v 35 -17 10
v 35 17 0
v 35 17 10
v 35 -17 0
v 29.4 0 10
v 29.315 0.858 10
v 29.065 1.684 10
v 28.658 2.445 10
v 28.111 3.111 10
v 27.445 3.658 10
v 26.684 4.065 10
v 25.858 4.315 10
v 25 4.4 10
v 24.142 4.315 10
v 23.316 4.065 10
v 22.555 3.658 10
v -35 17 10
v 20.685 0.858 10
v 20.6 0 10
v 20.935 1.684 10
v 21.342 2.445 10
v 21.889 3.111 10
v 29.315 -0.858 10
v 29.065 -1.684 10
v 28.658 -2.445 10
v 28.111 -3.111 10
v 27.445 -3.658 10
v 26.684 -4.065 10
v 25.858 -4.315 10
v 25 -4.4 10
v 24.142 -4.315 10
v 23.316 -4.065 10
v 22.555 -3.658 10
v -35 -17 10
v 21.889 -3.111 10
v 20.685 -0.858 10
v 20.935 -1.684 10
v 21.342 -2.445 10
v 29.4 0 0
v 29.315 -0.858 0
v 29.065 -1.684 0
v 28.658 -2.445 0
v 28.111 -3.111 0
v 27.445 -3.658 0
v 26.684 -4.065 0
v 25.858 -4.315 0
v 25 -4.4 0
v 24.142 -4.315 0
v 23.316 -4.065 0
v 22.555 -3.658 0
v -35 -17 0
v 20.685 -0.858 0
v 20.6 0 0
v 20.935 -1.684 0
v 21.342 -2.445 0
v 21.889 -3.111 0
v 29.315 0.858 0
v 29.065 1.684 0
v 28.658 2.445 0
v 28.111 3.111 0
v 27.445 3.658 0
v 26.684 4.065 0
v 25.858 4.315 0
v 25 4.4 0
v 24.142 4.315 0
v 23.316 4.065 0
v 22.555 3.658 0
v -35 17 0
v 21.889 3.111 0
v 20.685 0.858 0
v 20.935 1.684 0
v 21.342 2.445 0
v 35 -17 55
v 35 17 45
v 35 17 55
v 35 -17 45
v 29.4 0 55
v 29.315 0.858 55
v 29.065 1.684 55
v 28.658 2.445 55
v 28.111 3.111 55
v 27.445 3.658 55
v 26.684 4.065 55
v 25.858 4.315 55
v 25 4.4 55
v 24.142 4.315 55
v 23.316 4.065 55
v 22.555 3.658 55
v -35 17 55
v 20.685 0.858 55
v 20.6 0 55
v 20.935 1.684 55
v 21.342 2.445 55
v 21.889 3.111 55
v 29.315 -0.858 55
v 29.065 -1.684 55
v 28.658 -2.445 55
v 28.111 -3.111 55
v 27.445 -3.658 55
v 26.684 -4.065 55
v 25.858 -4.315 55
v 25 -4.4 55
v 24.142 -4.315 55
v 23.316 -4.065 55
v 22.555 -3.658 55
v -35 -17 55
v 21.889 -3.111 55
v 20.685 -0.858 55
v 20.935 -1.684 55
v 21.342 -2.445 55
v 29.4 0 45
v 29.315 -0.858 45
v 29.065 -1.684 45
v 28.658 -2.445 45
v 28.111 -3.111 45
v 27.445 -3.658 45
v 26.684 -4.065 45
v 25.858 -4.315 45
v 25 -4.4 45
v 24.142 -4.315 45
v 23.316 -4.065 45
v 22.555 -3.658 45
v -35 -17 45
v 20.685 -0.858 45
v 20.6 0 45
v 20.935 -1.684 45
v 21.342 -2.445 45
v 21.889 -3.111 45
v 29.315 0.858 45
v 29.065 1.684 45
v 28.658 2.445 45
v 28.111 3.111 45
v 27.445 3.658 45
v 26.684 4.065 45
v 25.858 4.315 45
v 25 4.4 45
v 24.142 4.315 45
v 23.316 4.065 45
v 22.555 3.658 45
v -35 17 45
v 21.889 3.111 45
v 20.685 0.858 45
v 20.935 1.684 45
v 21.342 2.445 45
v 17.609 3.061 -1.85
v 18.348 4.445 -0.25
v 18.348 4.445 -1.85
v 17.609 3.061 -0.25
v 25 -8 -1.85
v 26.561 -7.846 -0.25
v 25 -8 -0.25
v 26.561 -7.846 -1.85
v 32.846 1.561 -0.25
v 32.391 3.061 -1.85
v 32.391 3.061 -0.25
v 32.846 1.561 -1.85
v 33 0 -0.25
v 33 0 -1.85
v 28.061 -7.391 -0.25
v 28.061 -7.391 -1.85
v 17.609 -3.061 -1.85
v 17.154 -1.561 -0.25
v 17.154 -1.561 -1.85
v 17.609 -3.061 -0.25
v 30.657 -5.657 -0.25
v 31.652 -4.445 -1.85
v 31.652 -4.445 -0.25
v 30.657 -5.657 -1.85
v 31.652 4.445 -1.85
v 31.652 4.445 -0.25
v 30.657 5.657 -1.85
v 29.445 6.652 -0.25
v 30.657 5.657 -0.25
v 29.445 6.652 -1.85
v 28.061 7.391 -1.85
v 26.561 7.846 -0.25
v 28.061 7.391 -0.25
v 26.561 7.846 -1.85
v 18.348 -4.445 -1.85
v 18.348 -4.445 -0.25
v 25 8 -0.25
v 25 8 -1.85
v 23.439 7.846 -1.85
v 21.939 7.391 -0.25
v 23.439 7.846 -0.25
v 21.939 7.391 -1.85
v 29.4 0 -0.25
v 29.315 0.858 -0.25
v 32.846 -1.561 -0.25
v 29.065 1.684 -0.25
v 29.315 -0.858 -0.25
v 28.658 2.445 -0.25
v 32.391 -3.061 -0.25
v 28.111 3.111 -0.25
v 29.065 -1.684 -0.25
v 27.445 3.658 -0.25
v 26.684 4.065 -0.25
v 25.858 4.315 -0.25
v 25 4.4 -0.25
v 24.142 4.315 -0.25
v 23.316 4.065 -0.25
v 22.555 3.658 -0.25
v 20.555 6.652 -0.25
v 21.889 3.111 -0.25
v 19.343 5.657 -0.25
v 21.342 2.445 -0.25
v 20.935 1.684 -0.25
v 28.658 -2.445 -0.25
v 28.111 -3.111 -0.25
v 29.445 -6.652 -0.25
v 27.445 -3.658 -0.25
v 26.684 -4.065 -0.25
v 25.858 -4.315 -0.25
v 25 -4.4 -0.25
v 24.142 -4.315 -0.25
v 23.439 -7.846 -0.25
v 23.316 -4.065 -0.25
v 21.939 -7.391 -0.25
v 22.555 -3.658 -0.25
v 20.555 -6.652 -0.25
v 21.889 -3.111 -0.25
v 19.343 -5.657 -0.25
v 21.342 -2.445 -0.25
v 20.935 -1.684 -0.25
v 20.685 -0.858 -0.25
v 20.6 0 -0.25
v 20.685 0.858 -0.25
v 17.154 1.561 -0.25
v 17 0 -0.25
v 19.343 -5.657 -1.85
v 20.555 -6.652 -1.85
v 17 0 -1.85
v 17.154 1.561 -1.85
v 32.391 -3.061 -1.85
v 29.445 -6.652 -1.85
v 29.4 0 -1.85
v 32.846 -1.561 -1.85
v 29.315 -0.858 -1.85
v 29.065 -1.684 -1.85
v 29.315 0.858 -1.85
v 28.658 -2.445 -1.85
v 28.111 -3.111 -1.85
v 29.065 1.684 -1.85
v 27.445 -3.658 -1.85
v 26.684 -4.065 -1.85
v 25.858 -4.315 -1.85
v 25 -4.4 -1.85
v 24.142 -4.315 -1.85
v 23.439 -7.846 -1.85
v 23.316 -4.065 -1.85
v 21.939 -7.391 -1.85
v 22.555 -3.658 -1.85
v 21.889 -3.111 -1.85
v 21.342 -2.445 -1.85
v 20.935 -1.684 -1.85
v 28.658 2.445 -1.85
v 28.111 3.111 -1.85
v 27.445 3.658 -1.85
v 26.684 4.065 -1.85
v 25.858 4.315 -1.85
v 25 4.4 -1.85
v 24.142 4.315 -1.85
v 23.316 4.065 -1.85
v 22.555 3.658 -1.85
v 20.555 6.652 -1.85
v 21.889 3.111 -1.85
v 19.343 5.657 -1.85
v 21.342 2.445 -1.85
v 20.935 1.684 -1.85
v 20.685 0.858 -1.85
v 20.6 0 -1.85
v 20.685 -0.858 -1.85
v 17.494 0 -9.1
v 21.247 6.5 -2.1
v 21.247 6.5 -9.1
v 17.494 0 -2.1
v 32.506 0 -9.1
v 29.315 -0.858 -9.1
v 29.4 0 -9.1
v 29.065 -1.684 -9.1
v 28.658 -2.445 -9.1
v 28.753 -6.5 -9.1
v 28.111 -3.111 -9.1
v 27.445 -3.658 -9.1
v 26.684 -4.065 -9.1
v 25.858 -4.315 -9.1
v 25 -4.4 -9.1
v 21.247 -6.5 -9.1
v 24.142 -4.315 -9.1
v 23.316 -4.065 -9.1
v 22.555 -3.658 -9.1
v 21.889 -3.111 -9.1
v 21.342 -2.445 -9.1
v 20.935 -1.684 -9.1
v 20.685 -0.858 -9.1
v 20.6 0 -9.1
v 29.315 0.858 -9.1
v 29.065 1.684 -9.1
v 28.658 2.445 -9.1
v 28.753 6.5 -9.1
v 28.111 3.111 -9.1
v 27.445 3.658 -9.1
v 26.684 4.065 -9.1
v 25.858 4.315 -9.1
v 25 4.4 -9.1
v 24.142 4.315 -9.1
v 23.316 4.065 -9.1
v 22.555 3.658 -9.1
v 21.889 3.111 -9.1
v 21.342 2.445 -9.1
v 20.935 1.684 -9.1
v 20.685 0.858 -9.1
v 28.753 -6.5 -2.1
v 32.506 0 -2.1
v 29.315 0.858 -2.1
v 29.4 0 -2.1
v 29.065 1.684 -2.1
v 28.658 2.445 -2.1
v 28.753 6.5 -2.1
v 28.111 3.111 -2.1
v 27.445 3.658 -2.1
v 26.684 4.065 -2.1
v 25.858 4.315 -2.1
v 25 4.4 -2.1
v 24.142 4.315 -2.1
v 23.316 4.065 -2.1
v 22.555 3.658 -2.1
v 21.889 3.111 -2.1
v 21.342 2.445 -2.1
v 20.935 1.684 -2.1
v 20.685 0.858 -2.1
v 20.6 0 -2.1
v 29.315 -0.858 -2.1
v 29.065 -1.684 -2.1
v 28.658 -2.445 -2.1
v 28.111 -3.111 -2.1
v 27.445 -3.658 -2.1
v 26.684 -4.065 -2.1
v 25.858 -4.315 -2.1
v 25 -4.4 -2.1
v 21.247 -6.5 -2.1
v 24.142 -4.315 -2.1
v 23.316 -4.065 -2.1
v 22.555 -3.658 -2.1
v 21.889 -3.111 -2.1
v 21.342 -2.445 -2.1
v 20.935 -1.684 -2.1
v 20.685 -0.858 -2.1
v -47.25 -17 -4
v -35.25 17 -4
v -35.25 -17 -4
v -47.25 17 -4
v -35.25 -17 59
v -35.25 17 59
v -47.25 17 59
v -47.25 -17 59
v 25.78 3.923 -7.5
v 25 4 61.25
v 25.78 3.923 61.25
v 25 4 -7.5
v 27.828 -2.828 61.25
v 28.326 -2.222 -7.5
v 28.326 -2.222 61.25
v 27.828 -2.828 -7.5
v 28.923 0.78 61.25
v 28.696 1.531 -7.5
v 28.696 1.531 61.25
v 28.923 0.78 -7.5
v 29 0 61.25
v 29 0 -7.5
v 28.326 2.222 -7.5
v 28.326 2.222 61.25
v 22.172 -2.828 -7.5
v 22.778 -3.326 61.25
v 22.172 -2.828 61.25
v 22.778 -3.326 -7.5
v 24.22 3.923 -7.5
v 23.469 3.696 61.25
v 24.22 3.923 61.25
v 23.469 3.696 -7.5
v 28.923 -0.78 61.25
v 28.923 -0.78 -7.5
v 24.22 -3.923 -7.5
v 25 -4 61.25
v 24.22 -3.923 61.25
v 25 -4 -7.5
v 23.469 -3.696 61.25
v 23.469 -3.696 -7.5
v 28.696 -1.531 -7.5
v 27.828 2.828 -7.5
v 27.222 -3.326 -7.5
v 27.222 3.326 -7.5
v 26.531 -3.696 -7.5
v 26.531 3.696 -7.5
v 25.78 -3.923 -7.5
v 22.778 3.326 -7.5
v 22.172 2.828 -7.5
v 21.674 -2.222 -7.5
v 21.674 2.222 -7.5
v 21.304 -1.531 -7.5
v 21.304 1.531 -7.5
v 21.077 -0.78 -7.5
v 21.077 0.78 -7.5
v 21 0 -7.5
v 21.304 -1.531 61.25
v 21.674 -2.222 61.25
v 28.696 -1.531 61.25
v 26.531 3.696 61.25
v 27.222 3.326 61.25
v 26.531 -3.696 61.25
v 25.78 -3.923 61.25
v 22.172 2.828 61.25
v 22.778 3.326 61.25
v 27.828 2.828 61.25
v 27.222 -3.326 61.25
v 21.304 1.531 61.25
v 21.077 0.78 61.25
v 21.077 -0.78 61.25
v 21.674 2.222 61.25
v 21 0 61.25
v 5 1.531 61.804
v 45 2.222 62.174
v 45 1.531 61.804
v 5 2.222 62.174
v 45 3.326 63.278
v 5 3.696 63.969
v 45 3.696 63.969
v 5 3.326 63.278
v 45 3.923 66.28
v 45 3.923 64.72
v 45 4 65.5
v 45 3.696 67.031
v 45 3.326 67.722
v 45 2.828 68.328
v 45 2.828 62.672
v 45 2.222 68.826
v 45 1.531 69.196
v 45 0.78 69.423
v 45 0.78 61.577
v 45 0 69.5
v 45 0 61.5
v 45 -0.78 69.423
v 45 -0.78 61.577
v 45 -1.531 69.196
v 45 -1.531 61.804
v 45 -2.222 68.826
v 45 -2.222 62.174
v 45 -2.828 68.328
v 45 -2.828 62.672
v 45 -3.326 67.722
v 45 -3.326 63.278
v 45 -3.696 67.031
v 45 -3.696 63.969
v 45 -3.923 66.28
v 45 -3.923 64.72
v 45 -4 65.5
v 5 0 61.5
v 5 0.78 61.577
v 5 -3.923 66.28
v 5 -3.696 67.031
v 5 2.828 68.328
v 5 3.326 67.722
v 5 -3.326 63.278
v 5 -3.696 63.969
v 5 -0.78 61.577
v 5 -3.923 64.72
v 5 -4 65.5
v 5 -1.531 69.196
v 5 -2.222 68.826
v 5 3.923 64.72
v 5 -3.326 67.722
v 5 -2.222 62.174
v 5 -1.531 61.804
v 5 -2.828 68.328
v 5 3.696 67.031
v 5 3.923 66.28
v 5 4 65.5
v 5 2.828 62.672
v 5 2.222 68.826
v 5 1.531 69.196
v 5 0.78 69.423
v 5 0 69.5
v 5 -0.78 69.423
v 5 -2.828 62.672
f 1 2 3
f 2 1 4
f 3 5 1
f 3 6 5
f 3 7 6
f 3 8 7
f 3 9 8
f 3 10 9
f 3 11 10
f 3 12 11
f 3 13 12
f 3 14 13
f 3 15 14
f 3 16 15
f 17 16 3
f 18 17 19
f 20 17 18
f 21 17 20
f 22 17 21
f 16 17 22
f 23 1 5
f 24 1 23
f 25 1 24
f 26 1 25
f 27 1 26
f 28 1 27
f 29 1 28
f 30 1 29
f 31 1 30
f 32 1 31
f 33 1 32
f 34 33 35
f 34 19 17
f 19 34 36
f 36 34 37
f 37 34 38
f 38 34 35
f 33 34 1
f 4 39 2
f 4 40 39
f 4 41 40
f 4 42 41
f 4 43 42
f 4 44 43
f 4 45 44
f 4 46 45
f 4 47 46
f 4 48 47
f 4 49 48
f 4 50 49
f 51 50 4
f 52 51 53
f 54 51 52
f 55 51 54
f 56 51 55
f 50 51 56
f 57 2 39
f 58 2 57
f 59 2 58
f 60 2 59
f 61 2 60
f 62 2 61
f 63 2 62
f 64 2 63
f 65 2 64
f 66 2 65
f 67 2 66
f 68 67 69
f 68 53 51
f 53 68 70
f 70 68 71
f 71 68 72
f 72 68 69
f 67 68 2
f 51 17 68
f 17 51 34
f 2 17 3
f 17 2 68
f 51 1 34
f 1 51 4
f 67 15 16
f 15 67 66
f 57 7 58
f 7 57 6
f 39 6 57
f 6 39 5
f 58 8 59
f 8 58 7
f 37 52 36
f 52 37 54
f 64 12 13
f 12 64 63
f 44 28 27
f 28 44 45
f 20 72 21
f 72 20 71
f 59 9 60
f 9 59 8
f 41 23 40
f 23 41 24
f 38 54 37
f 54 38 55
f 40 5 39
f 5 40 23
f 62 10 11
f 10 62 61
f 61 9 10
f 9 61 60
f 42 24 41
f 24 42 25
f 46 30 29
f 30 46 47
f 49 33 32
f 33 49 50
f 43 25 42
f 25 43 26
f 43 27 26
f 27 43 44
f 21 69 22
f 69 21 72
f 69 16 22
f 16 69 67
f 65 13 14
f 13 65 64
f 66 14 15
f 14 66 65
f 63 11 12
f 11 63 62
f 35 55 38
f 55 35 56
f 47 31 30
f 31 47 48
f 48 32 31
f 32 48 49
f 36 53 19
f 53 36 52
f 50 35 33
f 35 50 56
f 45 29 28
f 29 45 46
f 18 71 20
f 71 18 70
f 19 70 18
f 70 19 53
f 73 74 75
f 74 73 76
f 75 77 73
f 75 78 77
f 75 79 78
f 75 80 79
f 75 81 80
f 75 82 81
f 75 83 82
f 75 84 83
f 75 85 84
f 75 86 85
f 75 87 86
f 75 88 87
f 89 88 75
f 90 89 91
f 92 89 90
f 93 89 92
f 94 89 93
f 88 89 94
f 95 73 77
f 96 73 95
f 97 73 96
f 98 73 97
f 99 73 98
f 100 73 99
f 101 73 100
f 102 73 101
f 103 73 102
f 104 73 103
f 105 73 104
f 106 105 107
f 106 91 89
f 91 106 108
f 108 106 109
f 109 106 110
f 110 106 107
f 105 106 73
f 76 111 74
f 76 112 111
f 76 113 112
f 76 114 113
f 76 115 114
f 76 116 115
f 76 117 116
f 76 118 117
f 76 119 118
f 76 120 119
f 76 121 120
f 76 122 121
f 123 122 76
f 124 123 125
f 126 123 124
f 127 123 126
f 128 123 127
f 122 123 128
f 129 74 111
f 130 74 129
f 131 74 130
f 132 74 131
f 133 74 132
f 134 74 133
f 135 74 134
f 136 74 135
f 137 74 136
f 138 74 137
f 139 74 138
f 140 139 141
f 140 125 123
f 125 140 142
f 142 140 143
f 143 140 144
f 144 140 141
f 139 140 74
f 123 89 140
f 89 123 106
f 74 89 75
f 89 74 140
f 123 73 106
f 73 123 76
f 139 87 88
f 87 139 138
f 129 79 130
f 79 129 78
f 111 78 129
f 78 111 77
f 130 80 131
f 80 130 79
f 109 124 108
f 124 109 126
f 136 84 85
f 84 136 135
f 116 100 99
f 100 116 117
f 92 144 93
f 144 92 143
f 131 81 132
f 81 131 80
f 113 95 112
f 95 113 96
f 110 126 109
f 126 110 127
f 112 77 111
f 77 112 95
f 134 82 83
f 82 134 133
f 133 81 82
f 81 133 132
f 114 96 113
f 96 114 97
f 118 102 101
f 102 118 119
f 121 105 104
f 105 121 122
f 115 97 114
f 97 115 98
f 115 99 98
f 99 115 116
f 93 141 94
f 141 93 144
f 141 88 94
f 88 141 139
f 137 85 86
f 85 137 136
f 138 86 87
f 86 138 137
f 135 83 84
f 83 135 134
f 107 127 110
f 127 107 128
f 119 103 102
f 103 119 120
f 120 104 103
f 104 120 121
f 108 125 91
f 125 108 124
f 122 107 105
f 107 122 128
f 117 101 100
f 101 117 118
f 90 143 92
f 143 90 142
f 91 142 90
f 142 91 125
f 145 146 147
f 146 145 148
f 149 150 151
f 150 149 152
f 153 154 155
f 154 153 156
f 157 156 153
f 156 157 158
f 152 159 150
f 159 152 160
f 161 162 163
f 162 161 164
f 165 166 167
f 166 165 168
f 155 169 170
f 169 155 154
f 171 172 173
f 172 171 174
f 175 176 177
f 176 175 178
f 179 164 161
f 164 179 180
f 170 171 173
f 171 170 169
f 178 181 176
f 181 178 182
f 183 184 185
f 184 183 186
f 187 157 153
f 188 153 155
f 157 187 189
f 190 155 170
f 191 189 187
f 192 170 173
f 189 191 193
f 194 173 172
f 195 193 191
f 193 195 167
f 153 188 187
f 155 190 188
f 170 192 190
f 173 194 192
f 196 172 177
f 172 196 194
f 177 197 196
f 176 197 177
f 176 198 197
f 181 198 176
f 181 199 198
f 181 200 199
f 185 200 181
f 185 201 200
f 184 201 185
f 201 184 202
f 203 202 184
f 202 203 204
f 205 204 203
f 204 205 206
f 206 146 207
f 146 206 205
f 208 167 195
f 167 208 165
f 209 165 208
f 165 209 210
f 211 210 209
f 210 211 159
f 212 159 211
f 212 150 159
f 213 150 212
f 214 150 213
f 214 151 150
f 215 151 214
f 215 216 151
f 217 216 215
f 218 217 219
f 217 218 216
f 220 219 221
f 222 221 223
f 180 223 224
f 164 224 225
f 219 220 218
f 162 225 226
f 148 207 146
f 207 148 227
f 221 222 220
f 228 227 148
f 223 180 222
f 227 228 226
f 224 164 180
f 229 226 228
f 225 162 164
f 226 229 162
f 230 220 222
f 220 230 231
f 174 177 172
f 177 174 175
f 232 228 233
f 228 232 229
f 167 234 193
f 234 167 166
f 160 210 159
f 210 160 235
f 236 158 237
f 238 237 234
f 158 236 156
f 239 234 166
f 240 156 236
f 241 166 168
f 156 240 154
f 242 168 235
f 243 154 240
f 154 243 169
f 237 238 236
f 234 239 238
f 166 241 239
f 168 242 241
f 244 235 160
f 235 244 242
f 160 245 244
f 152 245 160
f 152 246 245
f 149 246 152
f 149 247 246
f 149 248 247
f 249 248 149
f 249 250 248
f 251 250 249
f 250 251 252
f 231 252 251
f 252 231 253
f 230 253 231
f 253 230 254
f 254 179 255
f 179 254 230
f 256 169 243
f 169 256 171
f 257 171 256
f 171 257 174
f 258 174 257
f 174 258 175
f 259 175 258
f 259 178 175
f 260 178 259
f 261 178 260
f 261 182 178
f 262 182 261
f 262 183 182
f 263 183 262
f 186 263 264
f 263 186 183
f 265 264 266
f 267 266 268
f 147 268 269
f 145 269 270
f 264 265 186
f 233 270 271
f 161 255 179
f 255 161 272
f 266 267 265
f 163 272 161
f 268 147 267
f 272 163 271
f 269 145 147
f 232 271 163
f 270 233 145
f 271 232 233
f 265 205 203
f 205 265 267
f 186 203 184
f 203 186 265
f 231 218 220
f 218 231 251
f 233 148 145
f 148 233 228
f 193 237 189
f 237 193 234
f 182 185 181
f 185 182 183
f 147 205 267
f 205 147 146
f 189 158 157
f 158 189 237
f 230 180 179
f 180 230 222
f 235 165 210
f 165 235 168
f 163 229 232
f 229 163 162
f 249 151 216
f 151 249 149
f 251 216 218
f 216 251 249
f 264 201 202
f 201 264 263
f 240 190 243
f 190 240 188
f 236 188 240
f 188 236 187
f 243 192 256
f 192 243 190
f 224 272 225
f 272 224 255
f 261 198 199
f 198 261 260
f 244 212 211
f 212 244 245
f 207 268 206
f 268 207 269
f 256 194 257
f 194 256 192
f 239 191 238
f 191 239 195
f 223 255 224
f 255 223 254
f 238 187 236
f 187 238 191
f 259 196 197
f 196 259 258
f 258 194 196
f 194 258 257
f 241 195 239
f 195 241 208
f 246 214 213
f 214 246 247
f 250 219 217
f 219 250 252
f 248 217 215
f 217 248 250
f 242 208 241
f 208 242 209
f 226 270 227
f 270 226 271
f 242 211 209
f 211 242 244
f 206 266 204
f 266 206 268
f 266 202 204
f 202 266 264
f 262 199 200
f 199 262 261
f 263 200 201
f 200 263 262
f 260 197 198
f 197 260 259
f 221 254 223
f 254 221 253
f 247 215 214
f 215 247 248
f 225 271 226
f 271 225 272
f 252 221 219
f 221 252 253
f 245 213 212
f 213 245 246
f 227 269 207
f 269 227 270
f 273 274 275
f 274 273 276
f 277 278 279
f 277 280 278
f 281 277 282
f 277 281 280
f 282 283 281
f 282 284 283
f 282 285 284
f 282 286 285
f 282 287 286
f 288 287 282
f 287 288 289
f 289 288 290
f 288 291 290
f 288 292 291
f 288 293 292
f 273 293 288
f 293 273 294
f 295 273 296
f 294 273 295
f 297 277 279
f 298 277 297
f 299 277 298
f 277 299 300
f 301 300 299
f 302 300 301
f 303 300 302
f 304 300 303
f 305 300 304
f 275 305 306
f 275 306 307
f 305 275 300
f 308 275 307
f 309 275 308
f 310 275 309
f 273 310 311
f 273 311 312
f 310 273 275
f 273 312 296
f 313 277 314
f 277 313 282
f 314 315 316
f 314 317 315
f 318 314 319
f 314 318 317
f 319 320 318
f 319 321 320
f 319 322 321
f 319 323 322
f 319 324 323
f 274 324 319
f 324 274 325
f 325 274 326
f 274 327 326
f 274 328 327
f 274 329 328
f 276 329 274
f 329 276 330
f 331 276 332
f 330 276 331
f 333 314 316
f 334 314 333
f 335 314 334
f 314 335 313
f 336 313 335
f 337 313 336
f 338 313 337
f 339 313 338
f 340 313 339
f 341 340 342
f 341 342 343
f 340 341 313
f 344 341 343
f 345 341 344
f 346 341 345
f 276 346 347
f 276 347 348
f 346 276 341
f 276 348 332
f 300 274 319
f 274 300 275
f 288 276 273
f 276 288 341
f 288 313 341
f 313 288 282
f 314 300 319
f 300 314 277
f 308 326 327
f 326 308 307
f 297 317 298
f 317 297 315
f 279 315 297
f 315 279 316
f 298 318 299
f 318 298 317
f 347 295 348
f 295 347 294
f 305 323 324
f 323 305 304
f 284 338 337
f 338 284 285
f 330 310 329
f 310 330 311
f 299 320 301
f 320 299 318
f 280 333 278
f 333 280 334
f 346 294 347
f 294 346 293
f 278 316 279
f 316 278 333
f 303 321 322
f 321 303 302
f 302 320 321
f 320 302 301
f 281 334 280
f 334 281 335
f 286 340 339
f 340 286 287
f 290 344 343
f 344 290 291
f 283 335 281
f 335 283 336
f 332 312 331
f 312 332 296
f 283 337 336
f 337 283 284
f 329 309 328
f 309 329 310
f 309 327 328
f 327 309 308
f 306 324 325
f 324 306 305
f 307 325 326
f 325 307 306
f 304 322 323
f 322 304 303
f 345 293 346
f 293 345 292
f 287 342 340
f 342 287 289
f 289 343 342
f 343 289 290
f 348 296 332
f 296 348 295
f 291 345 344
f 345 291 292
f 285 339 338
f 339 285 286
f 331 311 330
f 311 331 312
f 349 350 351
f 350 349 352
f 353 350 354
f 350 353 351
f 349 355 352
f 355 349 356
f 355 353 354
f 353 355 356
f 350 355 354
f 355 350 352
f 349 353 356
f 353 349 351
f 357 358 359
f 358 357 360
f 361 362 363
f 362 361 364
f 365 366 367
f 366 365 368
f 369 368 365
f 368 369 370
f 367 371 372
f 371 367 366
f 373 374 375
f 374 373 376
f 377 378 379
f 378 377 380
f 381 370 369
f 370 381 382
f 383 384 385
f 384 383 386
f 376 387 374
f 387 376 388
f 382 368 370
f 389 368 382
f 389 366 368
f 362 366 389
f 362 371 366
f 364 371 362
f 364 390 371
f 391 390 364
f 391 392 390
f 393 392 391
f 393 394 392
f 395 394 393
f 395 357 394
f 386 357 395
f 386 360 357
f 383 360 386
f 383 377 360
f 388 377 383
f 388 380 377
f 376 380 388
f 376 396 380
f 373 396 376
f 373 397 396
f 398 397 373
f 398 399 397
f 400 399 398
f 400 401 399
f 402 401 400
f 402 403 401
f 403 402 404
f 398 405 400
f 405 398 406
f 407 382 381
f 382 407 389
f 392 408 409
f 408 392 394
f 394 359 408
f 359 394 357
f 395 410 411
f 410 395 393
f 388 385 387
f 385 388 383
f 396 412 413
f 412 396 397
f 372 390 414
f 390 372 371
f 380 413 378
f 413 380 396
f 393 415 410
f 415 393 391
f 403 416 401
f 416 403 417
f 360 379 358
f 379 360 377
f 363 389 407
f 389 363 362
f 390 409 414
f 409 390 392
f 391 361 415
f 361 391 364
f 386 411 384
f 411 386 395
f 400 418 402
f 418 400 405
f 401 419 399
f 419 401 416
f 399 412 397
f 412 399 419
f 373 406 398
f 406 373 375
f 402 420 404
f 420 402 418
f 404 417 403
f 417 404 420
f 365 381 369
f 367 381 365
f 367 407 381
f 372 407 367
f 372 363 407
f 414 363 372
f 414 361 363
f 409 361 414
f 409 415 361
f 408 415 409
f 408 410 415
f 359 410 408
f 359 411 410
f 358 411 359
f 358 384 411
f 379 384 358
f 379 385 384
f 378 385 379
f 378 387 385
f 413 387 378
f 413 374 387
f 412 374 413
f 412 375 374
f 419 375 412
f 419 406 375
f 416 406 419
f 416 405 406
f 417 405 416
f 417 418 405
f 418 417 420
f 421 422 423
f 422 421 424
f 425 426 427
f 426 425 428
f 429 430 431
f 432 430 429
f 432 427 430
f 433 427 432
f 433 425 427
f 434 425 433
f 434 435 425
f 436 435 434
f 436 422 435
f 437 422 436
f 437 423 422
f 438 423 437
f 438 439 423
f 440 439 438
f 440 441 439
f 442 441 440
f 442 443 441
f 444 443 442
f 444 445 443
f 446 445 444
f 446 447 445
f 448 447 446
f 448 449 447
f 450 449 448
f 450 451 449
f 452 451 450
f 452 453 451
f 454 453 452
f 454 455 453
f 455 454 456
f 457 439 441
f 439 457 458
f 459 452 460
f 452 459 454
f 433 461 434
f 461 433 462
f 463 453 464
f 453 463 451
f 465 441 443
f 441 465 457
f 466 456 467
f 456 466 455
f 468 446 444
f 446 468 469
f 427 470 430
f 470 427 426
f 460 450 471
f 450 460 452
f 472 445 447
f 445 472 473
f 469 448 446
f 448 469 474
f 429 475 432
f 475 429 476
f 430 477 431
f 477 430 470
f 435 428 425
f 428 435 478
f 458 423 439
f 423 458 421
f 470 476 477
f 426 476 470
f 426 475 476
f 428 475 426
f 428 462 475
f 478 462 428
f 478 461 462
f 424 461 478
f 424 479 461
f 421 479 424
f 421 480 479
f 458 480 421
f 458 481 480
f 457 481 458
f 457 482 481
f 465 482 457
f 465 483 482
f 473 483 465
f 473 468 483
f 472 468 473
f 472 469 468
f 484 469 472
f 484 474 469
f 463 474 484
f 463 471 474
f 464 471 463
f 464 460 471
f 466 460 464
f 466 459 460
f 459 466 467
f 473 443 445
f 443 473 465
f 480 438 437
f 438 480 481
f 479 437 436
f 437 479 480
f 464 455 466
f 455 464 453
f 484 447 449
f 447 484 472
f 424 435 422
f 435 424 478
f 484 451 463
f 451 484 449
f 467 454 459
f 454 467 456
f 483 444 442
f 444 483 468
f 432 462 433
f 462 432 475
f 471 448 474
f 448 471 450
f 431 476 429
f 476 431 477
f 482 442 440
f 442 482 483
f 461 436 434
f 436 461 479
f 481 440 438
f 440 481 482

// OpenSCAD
$fn = 32;

// ------------------------------------------------------------------------
// C clamp: throat 45 mm, screw d8
// Every part is its own module, assembly() places every instance.
// ------------------------------------------------------------------------

// --- part 1 ---
module clamp_arm() {
  difference() {
    translate([-35, -17, 0]) cube([70, 34, 10]);
    translate([25, 0, -1]) cylinder(h = 12, d = 8.8);
  }
}

// --- part 2 ---
module clamp_spine() {
  difference() {
    translate([-31.5, -17, 0]) cube([63, 34, 12]);
  }
}

// --- part 3 ---
module clamp_screw() {
  translate([0, 0, -34.375]) cylinder(h = 68.75, d = 8);
}

// --- part 4 ---
module clamp_washer() {
  difference() {
      translate([0, 0, 0]) cylinder(h = 1.6, d = 16);
      translate([0, 0, -1]) cylinder(h = 3.6, d = 8.8);
    }
}

// --- part 5 ---
module clamp_nut() {
  difference() {
    linear_extrude(height = 7) polygon(points = [[7.506, 0], [3.753, 6.5], [-3.753, 6.5], [-7.506, 0], [-3.753, -6.5], [3.753, -6.5]]);
    translate([0, 0, -1]) cylinder(h = 9, d = 8.8);
  }
}

// --- part 6 ---
module tommy_bar() {
  translate([0, 0, -20]) cylinder(h = 40, d = 8);
}

// --- assembly ---
module assembly() {
  color([0.80, 0.24, 0.20]) translate([0, 0, 0]) rotate([0, 0, 0]) clamp_arm();
  color([0.20, 0.45, 0.75]) translate([0, 0, 45]) rotate([0, 0, 0]) clamp_arm();
  color([0.25, 0.62, 0.32]) translate([-47.25, 0, 27.5]) rotate([0, 90, 0]) clamp_spine();
  color([0.92, 0.70, 0.18]) translate([25, 0, 26.875]) rotate([0, 0, 0]) clamp_screw();
  color([0.58, 0.35, 0.70]) translate([25, 0, -1.85]) rotate([0, 0, 0]) clamp_washer();
  color([0.16, 0.66, 0.66]) translate([25, 0, -9.1]) rotate([0, 0, 0]) clamp_nut();
  color([0.85, 0.48, 0.18]) translate([25, 0, 65.5]) rotate([0, 90, 0]) tommy_bar();
}

assembly();
